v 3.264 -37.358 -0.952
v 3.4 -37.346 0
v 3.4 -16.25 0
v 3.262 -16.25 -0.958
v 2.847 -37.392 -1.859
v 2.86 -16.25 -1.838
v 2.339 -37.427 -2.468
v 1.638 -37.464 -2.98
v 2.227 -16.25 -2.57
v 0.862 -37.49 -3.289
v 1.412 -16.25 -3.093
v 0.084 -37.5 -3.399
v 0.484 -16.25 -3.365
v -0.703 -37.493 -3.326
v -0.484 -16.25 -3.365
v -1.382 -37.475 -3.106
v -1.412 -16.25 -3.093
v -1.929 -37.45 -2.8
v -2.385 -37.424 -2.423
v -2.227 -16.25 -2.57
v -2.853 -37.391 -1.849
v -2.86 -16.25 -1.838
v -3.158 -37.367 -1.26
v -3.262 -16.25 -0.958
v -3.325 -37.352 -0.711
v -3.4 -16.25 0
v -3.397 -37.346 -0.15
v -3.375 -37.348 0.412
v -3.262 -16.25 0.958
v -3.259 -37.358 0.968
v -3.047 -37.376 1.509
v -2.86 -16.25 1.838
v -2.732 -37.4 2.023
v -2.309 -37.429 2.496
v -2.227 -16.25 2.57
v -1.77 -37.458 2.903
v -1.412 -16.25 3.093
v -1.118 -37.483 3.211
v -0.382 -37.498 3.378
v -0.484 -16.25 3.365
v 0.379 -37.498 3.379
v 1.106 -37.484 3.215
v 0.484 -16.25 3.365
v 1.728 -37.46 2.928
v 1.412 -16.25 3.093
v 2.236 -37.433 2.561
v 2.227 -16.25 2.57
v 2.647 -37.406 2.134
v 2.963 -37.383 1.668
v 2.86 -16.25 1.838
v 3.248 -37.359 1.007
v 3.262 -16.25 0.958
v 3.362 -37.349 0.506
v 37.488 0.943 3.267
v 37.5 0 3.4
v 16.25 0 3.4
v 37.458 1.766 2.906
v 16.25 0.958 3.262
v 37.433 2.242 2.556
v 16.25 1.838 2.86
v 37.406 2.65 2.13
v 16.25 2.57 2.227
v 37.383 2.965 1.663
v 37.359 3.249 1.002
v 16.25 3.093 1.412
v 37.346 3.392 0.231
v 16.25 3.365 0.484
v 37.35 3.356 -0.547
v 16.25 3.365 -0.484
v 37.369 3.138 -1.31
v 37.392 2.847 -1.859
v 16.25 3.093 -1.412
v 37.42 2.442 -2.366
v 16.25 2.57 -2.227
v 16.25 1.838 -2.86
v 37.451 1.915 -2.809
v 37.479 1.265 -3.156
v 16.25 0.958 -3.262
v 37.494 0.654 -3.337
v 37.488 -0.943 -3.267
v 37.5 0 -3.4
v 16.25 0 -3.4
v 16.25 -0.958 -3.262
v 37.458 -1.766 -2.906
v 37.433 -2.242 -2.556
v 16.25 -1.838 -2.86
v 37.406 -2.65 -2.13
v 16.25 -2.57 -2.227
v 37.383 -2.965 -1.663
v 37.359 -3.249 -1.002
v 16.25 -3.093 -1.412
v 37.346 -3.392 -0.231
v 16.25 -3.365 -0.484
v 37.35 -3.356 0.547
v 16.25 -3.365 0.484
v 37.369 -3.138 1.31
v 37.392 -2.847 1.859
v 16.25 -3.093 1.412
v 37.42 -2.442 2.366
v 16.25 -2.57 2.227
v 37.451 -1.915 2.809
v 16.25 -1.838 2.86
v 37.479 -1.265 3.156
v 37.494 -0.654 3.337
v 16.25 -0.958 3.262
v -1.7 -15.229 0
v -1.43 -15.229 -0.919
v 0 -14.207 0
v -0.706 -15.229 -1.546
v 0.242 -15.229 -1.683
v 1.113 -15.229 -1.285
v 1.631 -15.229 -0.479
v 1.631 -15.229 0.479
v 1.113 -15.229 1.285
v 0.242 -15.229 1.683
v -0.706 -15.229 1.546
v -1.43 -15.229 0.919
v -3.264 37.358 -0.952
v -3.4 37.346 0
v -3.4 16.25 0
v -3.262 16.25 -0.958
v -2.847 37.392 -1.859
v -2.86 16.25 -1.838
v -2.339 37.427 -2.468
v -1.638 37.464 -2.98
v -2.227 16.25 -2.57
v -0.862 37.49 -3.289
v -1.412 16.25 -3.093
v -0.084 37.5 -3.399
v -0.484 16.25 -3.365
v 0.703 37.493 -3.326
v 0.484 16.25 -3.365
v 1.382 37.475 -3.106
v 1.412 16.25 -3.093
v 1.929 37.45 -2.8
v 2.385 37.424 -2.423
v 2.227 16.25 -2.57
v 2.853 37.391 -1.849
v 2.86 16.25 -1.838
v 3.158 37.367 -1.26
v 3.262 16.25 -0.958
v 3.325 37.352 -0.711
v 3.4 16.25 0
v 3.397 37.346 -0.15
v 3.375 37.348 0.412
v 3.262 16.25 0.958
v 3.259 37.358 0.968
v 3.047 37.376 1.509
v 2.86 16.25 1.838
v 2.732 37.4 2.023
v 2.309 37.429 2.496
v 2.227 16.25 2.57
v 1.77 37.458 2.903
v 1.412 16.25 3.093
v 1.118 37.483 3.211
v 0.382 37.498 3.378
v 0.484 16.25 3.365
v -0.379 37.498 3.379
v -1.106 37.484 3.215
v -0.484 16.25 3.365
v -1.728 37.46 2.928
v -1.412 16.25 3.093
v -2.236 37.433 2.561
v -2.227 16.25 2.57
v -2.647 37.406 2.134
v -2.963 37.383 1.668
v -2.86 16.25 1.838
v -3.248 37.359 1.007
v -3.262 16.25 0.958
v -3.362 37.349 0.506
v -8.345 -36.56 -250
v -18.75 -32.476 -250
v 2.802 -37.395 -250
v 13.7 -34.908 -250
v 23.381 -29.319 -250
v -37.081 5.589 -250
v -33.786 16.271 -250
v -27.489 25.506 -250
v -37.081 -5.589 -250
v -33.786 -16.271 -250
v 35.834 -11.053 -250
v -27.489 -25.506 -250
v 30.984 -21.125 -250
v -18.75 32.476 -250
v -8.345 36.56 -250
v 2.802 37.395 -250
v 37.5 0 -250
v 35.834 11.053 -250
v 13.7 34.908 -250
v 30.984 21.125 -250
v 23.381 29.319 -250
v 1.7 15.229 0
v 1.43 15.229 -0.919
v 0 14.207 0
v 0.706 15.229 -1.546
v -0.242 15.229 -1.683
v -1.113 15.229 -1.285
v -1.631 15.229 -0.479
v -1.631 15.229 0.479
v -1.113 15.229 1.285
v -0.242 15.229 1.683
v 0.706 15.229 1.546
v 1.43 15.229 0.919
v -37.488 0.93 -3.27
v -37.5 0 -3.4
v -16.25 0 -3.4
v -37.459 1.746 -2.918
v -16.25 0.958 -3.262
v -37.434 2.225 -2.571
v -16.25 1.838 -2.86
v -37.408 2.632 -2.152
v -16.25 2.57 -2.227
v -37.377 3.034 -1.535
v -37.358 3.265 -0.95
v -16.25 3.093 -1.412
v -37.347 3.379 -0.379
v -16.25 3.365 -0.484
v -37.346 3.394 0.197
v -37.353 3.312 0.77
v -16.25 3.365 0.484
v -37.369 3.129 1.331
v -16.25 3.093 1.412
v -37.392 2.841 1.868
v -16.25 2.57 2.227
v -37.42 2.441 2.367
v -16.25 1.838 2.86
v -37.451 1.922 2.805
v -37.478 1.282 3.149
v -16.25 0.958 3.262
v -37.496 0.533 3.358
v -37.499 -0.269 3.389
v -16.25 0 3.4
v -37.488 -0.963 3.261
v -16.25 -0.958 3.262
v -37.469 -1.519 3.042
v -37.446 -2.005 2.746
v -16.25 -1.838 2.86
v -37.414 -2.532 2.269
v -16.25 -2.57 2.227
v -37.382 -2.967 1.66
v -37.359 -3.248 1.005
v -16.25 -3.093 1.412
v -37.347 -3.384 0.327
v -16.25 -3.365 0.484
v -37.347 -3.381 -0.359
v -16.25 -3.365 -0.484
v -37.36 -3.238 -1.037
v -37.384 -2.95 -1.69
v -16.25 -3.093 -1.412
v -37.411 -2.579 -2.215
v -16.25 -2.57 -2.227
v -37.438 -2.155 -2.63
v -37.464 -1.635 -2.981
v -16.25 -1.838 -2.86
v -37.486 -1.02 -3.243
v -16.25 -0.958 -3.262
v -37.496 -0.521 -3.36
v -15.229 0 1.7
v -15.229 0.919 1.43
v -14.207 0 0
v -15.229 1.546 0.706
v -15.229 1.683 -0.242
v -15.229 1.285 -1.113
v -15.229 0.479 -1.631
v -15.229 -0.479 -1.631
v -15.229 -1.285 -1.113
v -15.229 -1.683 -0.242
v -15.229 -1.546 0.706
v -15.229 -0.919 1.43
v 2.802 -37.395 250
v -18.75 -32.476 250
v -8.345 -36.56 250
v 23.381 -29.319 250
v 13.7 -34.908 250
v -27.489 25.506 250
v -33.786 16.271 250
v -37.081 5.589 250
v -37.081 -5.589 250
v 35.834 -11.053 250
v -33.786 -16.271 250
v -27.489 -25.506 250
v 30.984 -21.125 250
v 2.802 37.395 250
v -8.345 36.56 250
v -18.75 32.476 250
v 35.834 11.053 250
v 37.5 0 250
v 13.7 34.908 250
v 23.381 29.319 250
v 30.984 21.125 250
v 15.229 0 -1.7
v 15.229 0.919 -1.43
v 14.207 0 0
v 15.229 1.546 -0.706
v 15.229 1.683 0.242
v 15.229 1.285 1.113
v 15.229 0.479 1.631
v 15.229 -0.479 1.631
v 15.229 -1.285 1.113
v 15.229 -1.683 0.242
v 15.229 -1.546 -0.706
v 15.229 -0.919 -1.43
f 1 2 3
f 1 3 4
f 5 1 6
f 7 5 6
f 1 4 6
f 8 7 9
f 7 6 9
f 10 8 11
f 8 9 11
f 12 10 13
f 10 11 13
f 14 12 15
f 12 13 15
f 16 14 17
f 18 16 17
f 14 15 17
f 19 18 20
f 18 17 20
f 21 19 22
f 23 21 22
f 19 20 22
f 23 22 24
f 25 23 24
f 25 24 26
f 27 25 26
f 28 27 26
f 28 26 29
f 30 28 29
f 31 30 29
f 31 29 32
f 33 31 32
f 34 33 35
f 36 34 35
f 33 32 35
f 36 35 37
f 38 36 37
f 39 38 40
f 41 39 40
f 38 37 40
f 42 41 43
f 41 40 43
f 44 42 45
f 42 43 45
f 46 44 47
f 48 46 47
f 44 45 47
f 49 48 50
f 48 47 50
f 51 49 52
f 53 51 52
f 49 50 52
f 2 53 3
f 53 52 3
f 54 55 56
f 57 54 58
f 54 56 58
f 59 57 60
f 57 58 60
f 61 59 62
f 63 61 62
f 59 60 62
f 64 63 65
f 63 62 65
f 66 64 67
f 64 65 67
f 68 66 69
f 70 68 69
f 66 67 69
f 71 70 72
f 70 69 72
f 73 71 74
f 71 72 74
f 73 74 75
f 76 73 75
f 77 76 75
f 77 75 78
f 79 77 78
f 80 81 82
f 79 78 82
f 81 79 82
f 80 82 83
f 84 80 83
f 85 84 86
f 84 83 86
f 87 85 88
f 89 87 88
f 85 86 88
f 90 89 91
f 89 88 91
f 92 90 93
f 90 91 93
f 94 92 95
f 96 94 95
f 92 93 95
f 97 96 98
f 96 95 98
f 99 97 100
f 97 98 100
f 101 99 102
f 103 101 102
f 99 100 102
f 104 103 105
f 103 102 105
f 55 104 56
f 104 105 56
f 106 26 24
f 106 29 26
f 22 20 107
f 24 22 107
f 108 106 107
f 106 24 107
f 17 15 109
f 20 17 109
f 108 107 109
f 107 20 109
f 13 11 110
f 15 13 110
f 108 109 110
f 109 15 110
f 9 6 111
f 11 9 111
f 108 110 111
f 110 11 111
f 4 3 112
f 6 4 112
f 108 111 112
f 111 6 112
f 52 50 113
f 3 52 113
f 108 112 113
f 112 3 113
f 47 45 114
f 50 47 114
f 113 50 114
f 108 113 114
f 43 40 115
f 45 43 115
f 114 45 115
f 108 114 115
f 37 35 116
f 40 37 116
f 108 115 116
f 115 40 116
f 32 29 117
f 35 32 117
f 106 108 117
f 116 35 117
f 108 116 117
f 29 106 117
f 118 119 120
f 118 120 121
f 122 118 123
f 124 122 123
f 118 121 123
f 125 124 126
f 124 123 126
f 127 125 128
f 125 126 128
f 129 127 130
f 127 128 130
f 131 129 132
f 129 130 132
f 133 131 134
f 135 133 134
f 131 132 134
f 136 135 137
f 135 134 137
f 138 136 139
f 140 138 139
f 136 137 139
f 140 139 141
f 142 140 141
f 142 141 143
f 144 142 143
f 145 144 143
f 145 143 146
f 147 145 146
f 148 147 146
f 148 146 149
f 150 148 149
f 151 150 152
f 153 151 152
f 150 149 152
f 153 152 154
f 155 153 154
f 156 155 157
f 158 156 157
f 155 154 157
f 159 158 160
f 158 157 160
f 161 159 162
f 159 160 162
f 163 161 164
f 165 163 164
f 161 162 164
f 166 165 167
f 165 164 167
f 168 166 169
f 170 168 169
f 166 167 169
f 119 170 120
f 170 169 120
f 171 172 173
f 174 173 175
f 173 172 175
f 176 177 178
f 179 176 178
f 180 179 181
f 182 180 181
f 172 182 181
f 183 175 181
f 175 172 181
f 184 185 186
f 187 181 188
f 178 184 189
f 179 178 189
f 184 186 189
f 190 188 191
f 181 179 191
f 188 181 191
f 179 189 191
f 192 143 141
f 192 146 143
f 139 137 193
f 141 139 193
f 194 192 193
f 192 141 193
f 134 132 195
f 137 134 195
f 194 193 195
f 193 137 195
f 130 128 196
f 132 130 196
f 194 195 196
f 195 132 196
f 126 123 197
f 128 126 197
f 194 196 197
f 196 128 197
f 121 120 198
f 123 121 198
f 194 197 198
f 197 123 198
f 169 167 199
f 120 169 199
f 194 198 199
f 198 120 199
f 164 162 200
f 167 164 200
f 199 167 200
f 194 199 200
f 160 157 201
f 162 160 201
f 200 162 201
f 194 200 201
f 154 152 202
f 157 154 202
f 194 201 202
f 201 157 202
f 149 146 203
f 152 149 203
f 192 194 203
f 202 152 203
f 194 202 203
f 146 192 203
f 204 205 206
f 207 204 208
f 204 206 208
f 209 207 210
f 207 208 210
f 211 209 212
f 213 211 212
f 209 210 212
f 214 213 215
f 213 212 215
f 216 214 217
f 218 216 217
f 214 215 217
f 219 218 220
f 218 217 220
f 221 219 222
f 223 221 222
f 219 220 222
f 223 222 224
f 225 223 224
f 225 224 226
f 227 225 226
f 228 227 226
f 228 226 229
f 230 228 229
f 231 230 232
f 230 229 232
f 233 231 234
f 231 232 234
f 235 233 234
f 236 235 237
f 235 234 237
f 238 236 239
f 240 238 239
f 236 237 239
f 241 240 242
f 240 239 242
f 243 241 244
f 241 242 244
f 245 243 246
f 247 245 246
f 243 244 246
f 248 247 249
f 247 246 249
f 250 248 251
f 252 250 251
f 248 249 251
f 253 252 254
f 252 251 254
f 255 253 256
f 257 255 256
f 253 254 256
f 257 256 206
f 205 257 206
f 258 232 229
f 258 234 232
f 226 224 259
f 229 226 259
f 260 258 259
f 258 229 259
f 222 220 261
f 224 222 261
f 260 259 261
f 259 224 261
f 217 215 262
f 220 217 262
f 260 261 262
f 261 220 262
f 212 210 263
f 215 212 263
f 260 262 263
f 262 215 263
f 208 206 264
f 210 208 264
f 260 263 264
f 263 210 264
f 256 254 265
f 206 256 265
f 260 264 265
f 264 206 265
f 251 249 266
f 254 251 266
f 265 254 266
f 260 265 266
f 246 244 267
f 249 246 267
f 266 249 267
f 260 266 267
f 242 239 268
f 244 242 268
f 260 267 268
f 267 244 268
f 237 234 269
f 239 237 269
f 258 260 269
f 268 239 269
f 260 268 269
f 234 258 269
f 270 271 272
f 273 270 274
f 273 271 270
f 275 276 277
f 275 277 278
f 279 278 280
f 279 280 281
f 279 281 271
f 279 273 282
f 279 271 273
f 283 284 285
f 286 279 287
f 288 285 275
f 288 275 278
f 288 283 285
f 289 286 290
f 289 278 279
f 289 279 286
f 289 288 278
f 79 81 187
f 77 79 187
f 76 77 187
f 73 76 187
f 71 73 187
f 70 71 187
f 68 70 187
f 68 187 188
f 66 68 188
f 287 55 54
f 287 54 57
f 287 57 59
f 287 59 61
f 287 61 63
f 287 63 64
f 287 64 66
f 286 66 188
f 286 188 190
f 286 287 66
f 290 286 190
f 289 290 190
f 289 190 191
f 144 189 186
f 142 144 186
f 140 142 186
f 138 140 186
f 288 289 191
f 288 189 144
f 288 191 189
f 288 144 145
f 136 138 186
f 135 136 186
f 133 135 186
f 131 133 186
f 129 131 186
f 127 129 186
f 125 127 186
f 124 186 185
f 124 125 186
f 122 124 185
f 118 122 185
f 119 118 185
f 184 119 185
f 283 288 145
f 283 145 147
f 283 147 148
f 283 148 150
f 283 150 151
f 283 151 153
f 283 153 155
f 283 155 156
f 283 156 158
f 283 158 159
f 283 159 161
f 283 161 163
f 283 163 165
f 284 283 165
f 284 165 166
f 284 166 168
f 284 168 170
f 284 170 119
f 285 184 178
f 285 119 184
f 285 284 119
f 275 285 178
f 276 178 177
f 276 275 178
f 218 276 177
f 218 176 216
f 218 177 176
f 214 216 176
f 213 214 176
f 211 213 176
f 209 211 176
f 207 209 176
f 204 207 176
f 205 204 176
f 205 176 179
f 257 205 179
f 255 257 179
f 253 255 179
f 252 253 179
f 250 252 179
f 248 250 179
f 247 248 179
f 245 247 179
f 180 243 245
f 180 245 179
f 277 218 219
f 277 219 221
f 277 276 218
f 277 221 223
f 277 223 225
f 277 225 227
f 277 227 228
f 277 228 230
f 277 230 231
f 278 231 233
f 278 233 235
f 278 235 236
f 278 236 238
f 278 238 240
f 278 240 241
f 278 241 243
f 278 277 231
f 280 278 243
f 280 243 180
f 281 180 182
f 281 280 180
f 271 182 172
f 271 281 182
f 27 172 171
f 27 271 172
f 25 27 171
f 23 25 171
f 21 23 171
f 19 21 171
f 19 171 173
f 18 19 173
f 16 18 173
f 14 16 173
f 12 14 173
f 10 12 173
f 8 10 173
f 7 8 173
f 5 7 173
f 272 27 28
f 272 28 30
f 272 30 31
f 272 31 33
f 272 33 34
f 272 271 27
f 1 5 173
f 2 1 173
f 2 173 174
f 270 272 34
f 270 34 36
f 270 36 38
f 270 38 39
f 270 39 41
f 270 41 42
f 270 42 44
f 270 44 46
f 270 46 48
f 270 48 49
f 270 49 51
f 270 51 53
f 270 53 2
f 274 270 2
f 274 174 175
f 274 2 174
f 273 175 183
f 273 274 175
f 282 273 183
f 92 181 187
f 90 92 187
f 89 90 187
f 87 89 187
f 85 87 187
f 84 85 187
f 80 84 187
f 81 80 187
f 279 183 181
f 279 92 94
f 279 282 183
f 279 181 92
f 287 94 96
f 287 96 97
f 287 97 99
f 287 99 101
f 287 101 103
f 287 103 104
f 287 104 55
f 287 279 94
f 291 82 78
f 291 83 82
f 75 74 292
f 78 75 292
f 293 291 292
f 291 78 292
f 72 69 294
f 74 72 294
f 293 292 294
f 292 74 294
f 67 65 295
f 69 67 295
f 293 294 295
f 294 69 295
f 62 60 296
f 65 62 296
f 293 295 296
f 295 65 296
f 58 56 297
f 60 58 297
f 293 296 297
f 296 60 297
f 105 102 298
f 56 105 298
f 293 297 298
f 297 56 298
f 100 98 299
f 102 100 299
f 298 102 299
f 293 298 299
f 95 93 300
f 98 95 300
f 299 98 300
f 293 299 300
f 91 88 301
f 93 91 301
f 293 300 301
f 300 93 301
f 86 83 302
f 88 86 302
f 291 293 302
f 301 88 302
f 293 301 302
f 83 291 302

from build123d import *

# Parameters (mm, degrees)
SKETCH1_R                  = 37.5
BOSS_EXTRUDE1_DEPTH        = 250
M8X1_25_TAPPED_HOLE1_D     = 6.8
M8X1_25_TAPPED_HOLE1_DEPTH = 21.25
M8X1_25_TAPPED_HOLE1_TIP   = 2.042926105
M8X1_25_TAPPED_HOLE2_D     = 6.8
M8X1_25_TAPPED_HOLE2_DEPTH = 21.25
M8X1_25_TAPPED_HOLE2_TIP   = 2.042926105
M8X1_25_TAPPED_HOLE3_D     = 6.8
M8X1_25_TAPPED_HOLE3_DEPTH = 21.25
M8X1_25_TAPPED_HOLE3_TIP   = 2.042926105
M8X1_25_TAPPED_HOLE4_D     = 6.8
M8X1_25_TAPPED_HOLE4_DEPTH = 21.25
M8X1_25_TAPPED_HOLE4_TIP   = 2.042926105


with BuildPart() as part:
    # Sketch1 → Boss-Extrude1 (new body, symmetric)
    with BuildSketch(Plane.XY):
        Circle(SKETCH1_R)
    extrude(amount=BOSS_EXTRUDE1_DEPTH, both=True)

    # M8x1.25 Tapped Hole1
    with Locations(Plane(origin=(0, -37.5, 0), x_dir=(-1, 0, 0), z_dir=(0, -1, 0))):
        with Locations((0, 0)):
            Hole(M8X1_25_TAPPED_HOLE1_D / 2, depth=M8X1_25_TAPPED_HOLE1_DEPTH)
            with Locations((0, 0, -(M8X1_25_TAPPED_HOLE1_DEPTH + M8X1_25_TAPPED_HOLE1_TIP / 2))):  # 118° drill point
                Cone(0, M8X1_25_TAPPED_HOLE1_D / 2, M8X1_25_TAPPED_HOLE1_TIP, mode=Mode.SUBTRACT)

    # M8x1.25 Tapped Hole2
    with Locations(Plane(origin=(0, 37.5, 0), x_dir=(1, 0, 0), z_dir=(0, 1, 0))):
        with Locations((0, 0)):
            Hole(M8X1_25_TAPPED_HOLE2_D / 2, depth=M8X1_25_TAPPED_HOLE2_DEPTH)
            with Locations((0, 0, -(M8X1_25_TAPPED_HOLE2_DEPTH + M8X1_25_TAPPED_HOLE2_TIP / 2))):  # 118° drill point
                Cone(0, M8X1_25_TAPPED_HOLE2_D / 2, M8X1_25_TAPPED_HOLE2_TIP, mode=Mode.SUBTRACT)

    # M8x1.25 Tapped Hole3
    with Locations(Plane(origin=(37.5, 0, 0), x_dir=(0, 0, -1), z_dir=(1, 0, 0))):
        with Locations((0, 0)):
            Hole(M8X1_25_TAPPED_HOLE3_D / 2, depth=M8X1_25_TAPPED_HOLE3_DEPTH)
            with Locations((0, 0, -(M8X1_25_TAPPED_HOLE3_DEPTH + M8X1_25_TAPPED_HOLE3_TIP / 2))):  # 118° drill point
                Cone(0, M8X1_25_TAPPED_HOLE3_D / 2, M8X1_25_TAPPED_HOLE3_TIP, mode=Mode.SUBTRACT)

    # M8x1.25 Tapped Hole4
    with Locations(Plane.ZY.offset(37.5)):
        with Locations((0, 0)):
            Hole(M8X1_25_TAPPED_HOLE4_D / 2, depth=M8X1_25_TAPPED_HOLE4_DEPTH)
            with Locations((0, 0, -(M8X1_25_TAPPED_HOLE4_DEPTH + M8X1_25_TAPPED_HOLE4_TIP / 2))):  # 118° drill point
                Cone(0, M8X1_25_TAPPED_HOLE4_D / 2, M8X1_25_TAPPED_HOLE4_TIP, mode=Mode.SUBTRACT)


solid = part.part
